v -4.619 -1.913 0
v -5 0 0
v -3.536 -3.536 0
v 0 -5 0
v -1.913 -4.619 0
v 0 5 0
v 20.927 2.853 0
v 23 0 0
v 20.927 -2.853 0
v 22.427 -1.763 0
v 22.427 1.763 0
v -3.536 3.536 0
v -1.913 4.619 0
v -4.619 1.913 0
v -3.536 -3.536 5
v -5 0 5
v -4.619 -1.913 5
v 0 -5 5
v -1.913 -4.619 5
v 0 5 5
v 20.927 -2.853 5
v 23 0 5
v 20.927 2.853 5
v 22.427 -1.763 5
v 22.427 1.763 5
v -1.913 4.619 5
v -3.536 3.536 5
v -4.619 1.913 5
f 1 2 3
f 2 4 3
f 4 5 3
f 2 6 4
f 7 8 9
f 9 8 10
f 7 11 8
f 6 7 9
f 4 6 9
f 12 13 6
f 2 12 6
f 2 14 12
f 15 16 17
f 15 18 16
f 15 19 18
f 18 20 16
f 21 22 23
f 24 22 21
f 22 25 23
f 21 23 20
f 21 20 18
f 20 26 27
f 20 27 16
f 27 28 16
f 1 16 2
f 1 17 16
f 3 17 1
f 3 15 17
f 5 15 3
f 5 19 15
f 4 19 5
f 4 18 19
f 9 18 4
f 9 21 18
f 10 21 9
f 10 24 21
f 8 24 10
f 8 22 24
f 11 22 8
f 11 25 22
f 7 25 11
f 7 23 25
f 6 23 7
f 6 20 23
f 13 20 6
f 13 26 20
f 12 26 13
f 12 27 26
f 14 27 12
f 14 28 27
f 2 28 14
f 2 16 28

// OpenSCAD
// Hull of two circles
linear_extrude(height=5) hull() {
  circle(r=5);
  translate([20, 0]) circle(r=3);
}
